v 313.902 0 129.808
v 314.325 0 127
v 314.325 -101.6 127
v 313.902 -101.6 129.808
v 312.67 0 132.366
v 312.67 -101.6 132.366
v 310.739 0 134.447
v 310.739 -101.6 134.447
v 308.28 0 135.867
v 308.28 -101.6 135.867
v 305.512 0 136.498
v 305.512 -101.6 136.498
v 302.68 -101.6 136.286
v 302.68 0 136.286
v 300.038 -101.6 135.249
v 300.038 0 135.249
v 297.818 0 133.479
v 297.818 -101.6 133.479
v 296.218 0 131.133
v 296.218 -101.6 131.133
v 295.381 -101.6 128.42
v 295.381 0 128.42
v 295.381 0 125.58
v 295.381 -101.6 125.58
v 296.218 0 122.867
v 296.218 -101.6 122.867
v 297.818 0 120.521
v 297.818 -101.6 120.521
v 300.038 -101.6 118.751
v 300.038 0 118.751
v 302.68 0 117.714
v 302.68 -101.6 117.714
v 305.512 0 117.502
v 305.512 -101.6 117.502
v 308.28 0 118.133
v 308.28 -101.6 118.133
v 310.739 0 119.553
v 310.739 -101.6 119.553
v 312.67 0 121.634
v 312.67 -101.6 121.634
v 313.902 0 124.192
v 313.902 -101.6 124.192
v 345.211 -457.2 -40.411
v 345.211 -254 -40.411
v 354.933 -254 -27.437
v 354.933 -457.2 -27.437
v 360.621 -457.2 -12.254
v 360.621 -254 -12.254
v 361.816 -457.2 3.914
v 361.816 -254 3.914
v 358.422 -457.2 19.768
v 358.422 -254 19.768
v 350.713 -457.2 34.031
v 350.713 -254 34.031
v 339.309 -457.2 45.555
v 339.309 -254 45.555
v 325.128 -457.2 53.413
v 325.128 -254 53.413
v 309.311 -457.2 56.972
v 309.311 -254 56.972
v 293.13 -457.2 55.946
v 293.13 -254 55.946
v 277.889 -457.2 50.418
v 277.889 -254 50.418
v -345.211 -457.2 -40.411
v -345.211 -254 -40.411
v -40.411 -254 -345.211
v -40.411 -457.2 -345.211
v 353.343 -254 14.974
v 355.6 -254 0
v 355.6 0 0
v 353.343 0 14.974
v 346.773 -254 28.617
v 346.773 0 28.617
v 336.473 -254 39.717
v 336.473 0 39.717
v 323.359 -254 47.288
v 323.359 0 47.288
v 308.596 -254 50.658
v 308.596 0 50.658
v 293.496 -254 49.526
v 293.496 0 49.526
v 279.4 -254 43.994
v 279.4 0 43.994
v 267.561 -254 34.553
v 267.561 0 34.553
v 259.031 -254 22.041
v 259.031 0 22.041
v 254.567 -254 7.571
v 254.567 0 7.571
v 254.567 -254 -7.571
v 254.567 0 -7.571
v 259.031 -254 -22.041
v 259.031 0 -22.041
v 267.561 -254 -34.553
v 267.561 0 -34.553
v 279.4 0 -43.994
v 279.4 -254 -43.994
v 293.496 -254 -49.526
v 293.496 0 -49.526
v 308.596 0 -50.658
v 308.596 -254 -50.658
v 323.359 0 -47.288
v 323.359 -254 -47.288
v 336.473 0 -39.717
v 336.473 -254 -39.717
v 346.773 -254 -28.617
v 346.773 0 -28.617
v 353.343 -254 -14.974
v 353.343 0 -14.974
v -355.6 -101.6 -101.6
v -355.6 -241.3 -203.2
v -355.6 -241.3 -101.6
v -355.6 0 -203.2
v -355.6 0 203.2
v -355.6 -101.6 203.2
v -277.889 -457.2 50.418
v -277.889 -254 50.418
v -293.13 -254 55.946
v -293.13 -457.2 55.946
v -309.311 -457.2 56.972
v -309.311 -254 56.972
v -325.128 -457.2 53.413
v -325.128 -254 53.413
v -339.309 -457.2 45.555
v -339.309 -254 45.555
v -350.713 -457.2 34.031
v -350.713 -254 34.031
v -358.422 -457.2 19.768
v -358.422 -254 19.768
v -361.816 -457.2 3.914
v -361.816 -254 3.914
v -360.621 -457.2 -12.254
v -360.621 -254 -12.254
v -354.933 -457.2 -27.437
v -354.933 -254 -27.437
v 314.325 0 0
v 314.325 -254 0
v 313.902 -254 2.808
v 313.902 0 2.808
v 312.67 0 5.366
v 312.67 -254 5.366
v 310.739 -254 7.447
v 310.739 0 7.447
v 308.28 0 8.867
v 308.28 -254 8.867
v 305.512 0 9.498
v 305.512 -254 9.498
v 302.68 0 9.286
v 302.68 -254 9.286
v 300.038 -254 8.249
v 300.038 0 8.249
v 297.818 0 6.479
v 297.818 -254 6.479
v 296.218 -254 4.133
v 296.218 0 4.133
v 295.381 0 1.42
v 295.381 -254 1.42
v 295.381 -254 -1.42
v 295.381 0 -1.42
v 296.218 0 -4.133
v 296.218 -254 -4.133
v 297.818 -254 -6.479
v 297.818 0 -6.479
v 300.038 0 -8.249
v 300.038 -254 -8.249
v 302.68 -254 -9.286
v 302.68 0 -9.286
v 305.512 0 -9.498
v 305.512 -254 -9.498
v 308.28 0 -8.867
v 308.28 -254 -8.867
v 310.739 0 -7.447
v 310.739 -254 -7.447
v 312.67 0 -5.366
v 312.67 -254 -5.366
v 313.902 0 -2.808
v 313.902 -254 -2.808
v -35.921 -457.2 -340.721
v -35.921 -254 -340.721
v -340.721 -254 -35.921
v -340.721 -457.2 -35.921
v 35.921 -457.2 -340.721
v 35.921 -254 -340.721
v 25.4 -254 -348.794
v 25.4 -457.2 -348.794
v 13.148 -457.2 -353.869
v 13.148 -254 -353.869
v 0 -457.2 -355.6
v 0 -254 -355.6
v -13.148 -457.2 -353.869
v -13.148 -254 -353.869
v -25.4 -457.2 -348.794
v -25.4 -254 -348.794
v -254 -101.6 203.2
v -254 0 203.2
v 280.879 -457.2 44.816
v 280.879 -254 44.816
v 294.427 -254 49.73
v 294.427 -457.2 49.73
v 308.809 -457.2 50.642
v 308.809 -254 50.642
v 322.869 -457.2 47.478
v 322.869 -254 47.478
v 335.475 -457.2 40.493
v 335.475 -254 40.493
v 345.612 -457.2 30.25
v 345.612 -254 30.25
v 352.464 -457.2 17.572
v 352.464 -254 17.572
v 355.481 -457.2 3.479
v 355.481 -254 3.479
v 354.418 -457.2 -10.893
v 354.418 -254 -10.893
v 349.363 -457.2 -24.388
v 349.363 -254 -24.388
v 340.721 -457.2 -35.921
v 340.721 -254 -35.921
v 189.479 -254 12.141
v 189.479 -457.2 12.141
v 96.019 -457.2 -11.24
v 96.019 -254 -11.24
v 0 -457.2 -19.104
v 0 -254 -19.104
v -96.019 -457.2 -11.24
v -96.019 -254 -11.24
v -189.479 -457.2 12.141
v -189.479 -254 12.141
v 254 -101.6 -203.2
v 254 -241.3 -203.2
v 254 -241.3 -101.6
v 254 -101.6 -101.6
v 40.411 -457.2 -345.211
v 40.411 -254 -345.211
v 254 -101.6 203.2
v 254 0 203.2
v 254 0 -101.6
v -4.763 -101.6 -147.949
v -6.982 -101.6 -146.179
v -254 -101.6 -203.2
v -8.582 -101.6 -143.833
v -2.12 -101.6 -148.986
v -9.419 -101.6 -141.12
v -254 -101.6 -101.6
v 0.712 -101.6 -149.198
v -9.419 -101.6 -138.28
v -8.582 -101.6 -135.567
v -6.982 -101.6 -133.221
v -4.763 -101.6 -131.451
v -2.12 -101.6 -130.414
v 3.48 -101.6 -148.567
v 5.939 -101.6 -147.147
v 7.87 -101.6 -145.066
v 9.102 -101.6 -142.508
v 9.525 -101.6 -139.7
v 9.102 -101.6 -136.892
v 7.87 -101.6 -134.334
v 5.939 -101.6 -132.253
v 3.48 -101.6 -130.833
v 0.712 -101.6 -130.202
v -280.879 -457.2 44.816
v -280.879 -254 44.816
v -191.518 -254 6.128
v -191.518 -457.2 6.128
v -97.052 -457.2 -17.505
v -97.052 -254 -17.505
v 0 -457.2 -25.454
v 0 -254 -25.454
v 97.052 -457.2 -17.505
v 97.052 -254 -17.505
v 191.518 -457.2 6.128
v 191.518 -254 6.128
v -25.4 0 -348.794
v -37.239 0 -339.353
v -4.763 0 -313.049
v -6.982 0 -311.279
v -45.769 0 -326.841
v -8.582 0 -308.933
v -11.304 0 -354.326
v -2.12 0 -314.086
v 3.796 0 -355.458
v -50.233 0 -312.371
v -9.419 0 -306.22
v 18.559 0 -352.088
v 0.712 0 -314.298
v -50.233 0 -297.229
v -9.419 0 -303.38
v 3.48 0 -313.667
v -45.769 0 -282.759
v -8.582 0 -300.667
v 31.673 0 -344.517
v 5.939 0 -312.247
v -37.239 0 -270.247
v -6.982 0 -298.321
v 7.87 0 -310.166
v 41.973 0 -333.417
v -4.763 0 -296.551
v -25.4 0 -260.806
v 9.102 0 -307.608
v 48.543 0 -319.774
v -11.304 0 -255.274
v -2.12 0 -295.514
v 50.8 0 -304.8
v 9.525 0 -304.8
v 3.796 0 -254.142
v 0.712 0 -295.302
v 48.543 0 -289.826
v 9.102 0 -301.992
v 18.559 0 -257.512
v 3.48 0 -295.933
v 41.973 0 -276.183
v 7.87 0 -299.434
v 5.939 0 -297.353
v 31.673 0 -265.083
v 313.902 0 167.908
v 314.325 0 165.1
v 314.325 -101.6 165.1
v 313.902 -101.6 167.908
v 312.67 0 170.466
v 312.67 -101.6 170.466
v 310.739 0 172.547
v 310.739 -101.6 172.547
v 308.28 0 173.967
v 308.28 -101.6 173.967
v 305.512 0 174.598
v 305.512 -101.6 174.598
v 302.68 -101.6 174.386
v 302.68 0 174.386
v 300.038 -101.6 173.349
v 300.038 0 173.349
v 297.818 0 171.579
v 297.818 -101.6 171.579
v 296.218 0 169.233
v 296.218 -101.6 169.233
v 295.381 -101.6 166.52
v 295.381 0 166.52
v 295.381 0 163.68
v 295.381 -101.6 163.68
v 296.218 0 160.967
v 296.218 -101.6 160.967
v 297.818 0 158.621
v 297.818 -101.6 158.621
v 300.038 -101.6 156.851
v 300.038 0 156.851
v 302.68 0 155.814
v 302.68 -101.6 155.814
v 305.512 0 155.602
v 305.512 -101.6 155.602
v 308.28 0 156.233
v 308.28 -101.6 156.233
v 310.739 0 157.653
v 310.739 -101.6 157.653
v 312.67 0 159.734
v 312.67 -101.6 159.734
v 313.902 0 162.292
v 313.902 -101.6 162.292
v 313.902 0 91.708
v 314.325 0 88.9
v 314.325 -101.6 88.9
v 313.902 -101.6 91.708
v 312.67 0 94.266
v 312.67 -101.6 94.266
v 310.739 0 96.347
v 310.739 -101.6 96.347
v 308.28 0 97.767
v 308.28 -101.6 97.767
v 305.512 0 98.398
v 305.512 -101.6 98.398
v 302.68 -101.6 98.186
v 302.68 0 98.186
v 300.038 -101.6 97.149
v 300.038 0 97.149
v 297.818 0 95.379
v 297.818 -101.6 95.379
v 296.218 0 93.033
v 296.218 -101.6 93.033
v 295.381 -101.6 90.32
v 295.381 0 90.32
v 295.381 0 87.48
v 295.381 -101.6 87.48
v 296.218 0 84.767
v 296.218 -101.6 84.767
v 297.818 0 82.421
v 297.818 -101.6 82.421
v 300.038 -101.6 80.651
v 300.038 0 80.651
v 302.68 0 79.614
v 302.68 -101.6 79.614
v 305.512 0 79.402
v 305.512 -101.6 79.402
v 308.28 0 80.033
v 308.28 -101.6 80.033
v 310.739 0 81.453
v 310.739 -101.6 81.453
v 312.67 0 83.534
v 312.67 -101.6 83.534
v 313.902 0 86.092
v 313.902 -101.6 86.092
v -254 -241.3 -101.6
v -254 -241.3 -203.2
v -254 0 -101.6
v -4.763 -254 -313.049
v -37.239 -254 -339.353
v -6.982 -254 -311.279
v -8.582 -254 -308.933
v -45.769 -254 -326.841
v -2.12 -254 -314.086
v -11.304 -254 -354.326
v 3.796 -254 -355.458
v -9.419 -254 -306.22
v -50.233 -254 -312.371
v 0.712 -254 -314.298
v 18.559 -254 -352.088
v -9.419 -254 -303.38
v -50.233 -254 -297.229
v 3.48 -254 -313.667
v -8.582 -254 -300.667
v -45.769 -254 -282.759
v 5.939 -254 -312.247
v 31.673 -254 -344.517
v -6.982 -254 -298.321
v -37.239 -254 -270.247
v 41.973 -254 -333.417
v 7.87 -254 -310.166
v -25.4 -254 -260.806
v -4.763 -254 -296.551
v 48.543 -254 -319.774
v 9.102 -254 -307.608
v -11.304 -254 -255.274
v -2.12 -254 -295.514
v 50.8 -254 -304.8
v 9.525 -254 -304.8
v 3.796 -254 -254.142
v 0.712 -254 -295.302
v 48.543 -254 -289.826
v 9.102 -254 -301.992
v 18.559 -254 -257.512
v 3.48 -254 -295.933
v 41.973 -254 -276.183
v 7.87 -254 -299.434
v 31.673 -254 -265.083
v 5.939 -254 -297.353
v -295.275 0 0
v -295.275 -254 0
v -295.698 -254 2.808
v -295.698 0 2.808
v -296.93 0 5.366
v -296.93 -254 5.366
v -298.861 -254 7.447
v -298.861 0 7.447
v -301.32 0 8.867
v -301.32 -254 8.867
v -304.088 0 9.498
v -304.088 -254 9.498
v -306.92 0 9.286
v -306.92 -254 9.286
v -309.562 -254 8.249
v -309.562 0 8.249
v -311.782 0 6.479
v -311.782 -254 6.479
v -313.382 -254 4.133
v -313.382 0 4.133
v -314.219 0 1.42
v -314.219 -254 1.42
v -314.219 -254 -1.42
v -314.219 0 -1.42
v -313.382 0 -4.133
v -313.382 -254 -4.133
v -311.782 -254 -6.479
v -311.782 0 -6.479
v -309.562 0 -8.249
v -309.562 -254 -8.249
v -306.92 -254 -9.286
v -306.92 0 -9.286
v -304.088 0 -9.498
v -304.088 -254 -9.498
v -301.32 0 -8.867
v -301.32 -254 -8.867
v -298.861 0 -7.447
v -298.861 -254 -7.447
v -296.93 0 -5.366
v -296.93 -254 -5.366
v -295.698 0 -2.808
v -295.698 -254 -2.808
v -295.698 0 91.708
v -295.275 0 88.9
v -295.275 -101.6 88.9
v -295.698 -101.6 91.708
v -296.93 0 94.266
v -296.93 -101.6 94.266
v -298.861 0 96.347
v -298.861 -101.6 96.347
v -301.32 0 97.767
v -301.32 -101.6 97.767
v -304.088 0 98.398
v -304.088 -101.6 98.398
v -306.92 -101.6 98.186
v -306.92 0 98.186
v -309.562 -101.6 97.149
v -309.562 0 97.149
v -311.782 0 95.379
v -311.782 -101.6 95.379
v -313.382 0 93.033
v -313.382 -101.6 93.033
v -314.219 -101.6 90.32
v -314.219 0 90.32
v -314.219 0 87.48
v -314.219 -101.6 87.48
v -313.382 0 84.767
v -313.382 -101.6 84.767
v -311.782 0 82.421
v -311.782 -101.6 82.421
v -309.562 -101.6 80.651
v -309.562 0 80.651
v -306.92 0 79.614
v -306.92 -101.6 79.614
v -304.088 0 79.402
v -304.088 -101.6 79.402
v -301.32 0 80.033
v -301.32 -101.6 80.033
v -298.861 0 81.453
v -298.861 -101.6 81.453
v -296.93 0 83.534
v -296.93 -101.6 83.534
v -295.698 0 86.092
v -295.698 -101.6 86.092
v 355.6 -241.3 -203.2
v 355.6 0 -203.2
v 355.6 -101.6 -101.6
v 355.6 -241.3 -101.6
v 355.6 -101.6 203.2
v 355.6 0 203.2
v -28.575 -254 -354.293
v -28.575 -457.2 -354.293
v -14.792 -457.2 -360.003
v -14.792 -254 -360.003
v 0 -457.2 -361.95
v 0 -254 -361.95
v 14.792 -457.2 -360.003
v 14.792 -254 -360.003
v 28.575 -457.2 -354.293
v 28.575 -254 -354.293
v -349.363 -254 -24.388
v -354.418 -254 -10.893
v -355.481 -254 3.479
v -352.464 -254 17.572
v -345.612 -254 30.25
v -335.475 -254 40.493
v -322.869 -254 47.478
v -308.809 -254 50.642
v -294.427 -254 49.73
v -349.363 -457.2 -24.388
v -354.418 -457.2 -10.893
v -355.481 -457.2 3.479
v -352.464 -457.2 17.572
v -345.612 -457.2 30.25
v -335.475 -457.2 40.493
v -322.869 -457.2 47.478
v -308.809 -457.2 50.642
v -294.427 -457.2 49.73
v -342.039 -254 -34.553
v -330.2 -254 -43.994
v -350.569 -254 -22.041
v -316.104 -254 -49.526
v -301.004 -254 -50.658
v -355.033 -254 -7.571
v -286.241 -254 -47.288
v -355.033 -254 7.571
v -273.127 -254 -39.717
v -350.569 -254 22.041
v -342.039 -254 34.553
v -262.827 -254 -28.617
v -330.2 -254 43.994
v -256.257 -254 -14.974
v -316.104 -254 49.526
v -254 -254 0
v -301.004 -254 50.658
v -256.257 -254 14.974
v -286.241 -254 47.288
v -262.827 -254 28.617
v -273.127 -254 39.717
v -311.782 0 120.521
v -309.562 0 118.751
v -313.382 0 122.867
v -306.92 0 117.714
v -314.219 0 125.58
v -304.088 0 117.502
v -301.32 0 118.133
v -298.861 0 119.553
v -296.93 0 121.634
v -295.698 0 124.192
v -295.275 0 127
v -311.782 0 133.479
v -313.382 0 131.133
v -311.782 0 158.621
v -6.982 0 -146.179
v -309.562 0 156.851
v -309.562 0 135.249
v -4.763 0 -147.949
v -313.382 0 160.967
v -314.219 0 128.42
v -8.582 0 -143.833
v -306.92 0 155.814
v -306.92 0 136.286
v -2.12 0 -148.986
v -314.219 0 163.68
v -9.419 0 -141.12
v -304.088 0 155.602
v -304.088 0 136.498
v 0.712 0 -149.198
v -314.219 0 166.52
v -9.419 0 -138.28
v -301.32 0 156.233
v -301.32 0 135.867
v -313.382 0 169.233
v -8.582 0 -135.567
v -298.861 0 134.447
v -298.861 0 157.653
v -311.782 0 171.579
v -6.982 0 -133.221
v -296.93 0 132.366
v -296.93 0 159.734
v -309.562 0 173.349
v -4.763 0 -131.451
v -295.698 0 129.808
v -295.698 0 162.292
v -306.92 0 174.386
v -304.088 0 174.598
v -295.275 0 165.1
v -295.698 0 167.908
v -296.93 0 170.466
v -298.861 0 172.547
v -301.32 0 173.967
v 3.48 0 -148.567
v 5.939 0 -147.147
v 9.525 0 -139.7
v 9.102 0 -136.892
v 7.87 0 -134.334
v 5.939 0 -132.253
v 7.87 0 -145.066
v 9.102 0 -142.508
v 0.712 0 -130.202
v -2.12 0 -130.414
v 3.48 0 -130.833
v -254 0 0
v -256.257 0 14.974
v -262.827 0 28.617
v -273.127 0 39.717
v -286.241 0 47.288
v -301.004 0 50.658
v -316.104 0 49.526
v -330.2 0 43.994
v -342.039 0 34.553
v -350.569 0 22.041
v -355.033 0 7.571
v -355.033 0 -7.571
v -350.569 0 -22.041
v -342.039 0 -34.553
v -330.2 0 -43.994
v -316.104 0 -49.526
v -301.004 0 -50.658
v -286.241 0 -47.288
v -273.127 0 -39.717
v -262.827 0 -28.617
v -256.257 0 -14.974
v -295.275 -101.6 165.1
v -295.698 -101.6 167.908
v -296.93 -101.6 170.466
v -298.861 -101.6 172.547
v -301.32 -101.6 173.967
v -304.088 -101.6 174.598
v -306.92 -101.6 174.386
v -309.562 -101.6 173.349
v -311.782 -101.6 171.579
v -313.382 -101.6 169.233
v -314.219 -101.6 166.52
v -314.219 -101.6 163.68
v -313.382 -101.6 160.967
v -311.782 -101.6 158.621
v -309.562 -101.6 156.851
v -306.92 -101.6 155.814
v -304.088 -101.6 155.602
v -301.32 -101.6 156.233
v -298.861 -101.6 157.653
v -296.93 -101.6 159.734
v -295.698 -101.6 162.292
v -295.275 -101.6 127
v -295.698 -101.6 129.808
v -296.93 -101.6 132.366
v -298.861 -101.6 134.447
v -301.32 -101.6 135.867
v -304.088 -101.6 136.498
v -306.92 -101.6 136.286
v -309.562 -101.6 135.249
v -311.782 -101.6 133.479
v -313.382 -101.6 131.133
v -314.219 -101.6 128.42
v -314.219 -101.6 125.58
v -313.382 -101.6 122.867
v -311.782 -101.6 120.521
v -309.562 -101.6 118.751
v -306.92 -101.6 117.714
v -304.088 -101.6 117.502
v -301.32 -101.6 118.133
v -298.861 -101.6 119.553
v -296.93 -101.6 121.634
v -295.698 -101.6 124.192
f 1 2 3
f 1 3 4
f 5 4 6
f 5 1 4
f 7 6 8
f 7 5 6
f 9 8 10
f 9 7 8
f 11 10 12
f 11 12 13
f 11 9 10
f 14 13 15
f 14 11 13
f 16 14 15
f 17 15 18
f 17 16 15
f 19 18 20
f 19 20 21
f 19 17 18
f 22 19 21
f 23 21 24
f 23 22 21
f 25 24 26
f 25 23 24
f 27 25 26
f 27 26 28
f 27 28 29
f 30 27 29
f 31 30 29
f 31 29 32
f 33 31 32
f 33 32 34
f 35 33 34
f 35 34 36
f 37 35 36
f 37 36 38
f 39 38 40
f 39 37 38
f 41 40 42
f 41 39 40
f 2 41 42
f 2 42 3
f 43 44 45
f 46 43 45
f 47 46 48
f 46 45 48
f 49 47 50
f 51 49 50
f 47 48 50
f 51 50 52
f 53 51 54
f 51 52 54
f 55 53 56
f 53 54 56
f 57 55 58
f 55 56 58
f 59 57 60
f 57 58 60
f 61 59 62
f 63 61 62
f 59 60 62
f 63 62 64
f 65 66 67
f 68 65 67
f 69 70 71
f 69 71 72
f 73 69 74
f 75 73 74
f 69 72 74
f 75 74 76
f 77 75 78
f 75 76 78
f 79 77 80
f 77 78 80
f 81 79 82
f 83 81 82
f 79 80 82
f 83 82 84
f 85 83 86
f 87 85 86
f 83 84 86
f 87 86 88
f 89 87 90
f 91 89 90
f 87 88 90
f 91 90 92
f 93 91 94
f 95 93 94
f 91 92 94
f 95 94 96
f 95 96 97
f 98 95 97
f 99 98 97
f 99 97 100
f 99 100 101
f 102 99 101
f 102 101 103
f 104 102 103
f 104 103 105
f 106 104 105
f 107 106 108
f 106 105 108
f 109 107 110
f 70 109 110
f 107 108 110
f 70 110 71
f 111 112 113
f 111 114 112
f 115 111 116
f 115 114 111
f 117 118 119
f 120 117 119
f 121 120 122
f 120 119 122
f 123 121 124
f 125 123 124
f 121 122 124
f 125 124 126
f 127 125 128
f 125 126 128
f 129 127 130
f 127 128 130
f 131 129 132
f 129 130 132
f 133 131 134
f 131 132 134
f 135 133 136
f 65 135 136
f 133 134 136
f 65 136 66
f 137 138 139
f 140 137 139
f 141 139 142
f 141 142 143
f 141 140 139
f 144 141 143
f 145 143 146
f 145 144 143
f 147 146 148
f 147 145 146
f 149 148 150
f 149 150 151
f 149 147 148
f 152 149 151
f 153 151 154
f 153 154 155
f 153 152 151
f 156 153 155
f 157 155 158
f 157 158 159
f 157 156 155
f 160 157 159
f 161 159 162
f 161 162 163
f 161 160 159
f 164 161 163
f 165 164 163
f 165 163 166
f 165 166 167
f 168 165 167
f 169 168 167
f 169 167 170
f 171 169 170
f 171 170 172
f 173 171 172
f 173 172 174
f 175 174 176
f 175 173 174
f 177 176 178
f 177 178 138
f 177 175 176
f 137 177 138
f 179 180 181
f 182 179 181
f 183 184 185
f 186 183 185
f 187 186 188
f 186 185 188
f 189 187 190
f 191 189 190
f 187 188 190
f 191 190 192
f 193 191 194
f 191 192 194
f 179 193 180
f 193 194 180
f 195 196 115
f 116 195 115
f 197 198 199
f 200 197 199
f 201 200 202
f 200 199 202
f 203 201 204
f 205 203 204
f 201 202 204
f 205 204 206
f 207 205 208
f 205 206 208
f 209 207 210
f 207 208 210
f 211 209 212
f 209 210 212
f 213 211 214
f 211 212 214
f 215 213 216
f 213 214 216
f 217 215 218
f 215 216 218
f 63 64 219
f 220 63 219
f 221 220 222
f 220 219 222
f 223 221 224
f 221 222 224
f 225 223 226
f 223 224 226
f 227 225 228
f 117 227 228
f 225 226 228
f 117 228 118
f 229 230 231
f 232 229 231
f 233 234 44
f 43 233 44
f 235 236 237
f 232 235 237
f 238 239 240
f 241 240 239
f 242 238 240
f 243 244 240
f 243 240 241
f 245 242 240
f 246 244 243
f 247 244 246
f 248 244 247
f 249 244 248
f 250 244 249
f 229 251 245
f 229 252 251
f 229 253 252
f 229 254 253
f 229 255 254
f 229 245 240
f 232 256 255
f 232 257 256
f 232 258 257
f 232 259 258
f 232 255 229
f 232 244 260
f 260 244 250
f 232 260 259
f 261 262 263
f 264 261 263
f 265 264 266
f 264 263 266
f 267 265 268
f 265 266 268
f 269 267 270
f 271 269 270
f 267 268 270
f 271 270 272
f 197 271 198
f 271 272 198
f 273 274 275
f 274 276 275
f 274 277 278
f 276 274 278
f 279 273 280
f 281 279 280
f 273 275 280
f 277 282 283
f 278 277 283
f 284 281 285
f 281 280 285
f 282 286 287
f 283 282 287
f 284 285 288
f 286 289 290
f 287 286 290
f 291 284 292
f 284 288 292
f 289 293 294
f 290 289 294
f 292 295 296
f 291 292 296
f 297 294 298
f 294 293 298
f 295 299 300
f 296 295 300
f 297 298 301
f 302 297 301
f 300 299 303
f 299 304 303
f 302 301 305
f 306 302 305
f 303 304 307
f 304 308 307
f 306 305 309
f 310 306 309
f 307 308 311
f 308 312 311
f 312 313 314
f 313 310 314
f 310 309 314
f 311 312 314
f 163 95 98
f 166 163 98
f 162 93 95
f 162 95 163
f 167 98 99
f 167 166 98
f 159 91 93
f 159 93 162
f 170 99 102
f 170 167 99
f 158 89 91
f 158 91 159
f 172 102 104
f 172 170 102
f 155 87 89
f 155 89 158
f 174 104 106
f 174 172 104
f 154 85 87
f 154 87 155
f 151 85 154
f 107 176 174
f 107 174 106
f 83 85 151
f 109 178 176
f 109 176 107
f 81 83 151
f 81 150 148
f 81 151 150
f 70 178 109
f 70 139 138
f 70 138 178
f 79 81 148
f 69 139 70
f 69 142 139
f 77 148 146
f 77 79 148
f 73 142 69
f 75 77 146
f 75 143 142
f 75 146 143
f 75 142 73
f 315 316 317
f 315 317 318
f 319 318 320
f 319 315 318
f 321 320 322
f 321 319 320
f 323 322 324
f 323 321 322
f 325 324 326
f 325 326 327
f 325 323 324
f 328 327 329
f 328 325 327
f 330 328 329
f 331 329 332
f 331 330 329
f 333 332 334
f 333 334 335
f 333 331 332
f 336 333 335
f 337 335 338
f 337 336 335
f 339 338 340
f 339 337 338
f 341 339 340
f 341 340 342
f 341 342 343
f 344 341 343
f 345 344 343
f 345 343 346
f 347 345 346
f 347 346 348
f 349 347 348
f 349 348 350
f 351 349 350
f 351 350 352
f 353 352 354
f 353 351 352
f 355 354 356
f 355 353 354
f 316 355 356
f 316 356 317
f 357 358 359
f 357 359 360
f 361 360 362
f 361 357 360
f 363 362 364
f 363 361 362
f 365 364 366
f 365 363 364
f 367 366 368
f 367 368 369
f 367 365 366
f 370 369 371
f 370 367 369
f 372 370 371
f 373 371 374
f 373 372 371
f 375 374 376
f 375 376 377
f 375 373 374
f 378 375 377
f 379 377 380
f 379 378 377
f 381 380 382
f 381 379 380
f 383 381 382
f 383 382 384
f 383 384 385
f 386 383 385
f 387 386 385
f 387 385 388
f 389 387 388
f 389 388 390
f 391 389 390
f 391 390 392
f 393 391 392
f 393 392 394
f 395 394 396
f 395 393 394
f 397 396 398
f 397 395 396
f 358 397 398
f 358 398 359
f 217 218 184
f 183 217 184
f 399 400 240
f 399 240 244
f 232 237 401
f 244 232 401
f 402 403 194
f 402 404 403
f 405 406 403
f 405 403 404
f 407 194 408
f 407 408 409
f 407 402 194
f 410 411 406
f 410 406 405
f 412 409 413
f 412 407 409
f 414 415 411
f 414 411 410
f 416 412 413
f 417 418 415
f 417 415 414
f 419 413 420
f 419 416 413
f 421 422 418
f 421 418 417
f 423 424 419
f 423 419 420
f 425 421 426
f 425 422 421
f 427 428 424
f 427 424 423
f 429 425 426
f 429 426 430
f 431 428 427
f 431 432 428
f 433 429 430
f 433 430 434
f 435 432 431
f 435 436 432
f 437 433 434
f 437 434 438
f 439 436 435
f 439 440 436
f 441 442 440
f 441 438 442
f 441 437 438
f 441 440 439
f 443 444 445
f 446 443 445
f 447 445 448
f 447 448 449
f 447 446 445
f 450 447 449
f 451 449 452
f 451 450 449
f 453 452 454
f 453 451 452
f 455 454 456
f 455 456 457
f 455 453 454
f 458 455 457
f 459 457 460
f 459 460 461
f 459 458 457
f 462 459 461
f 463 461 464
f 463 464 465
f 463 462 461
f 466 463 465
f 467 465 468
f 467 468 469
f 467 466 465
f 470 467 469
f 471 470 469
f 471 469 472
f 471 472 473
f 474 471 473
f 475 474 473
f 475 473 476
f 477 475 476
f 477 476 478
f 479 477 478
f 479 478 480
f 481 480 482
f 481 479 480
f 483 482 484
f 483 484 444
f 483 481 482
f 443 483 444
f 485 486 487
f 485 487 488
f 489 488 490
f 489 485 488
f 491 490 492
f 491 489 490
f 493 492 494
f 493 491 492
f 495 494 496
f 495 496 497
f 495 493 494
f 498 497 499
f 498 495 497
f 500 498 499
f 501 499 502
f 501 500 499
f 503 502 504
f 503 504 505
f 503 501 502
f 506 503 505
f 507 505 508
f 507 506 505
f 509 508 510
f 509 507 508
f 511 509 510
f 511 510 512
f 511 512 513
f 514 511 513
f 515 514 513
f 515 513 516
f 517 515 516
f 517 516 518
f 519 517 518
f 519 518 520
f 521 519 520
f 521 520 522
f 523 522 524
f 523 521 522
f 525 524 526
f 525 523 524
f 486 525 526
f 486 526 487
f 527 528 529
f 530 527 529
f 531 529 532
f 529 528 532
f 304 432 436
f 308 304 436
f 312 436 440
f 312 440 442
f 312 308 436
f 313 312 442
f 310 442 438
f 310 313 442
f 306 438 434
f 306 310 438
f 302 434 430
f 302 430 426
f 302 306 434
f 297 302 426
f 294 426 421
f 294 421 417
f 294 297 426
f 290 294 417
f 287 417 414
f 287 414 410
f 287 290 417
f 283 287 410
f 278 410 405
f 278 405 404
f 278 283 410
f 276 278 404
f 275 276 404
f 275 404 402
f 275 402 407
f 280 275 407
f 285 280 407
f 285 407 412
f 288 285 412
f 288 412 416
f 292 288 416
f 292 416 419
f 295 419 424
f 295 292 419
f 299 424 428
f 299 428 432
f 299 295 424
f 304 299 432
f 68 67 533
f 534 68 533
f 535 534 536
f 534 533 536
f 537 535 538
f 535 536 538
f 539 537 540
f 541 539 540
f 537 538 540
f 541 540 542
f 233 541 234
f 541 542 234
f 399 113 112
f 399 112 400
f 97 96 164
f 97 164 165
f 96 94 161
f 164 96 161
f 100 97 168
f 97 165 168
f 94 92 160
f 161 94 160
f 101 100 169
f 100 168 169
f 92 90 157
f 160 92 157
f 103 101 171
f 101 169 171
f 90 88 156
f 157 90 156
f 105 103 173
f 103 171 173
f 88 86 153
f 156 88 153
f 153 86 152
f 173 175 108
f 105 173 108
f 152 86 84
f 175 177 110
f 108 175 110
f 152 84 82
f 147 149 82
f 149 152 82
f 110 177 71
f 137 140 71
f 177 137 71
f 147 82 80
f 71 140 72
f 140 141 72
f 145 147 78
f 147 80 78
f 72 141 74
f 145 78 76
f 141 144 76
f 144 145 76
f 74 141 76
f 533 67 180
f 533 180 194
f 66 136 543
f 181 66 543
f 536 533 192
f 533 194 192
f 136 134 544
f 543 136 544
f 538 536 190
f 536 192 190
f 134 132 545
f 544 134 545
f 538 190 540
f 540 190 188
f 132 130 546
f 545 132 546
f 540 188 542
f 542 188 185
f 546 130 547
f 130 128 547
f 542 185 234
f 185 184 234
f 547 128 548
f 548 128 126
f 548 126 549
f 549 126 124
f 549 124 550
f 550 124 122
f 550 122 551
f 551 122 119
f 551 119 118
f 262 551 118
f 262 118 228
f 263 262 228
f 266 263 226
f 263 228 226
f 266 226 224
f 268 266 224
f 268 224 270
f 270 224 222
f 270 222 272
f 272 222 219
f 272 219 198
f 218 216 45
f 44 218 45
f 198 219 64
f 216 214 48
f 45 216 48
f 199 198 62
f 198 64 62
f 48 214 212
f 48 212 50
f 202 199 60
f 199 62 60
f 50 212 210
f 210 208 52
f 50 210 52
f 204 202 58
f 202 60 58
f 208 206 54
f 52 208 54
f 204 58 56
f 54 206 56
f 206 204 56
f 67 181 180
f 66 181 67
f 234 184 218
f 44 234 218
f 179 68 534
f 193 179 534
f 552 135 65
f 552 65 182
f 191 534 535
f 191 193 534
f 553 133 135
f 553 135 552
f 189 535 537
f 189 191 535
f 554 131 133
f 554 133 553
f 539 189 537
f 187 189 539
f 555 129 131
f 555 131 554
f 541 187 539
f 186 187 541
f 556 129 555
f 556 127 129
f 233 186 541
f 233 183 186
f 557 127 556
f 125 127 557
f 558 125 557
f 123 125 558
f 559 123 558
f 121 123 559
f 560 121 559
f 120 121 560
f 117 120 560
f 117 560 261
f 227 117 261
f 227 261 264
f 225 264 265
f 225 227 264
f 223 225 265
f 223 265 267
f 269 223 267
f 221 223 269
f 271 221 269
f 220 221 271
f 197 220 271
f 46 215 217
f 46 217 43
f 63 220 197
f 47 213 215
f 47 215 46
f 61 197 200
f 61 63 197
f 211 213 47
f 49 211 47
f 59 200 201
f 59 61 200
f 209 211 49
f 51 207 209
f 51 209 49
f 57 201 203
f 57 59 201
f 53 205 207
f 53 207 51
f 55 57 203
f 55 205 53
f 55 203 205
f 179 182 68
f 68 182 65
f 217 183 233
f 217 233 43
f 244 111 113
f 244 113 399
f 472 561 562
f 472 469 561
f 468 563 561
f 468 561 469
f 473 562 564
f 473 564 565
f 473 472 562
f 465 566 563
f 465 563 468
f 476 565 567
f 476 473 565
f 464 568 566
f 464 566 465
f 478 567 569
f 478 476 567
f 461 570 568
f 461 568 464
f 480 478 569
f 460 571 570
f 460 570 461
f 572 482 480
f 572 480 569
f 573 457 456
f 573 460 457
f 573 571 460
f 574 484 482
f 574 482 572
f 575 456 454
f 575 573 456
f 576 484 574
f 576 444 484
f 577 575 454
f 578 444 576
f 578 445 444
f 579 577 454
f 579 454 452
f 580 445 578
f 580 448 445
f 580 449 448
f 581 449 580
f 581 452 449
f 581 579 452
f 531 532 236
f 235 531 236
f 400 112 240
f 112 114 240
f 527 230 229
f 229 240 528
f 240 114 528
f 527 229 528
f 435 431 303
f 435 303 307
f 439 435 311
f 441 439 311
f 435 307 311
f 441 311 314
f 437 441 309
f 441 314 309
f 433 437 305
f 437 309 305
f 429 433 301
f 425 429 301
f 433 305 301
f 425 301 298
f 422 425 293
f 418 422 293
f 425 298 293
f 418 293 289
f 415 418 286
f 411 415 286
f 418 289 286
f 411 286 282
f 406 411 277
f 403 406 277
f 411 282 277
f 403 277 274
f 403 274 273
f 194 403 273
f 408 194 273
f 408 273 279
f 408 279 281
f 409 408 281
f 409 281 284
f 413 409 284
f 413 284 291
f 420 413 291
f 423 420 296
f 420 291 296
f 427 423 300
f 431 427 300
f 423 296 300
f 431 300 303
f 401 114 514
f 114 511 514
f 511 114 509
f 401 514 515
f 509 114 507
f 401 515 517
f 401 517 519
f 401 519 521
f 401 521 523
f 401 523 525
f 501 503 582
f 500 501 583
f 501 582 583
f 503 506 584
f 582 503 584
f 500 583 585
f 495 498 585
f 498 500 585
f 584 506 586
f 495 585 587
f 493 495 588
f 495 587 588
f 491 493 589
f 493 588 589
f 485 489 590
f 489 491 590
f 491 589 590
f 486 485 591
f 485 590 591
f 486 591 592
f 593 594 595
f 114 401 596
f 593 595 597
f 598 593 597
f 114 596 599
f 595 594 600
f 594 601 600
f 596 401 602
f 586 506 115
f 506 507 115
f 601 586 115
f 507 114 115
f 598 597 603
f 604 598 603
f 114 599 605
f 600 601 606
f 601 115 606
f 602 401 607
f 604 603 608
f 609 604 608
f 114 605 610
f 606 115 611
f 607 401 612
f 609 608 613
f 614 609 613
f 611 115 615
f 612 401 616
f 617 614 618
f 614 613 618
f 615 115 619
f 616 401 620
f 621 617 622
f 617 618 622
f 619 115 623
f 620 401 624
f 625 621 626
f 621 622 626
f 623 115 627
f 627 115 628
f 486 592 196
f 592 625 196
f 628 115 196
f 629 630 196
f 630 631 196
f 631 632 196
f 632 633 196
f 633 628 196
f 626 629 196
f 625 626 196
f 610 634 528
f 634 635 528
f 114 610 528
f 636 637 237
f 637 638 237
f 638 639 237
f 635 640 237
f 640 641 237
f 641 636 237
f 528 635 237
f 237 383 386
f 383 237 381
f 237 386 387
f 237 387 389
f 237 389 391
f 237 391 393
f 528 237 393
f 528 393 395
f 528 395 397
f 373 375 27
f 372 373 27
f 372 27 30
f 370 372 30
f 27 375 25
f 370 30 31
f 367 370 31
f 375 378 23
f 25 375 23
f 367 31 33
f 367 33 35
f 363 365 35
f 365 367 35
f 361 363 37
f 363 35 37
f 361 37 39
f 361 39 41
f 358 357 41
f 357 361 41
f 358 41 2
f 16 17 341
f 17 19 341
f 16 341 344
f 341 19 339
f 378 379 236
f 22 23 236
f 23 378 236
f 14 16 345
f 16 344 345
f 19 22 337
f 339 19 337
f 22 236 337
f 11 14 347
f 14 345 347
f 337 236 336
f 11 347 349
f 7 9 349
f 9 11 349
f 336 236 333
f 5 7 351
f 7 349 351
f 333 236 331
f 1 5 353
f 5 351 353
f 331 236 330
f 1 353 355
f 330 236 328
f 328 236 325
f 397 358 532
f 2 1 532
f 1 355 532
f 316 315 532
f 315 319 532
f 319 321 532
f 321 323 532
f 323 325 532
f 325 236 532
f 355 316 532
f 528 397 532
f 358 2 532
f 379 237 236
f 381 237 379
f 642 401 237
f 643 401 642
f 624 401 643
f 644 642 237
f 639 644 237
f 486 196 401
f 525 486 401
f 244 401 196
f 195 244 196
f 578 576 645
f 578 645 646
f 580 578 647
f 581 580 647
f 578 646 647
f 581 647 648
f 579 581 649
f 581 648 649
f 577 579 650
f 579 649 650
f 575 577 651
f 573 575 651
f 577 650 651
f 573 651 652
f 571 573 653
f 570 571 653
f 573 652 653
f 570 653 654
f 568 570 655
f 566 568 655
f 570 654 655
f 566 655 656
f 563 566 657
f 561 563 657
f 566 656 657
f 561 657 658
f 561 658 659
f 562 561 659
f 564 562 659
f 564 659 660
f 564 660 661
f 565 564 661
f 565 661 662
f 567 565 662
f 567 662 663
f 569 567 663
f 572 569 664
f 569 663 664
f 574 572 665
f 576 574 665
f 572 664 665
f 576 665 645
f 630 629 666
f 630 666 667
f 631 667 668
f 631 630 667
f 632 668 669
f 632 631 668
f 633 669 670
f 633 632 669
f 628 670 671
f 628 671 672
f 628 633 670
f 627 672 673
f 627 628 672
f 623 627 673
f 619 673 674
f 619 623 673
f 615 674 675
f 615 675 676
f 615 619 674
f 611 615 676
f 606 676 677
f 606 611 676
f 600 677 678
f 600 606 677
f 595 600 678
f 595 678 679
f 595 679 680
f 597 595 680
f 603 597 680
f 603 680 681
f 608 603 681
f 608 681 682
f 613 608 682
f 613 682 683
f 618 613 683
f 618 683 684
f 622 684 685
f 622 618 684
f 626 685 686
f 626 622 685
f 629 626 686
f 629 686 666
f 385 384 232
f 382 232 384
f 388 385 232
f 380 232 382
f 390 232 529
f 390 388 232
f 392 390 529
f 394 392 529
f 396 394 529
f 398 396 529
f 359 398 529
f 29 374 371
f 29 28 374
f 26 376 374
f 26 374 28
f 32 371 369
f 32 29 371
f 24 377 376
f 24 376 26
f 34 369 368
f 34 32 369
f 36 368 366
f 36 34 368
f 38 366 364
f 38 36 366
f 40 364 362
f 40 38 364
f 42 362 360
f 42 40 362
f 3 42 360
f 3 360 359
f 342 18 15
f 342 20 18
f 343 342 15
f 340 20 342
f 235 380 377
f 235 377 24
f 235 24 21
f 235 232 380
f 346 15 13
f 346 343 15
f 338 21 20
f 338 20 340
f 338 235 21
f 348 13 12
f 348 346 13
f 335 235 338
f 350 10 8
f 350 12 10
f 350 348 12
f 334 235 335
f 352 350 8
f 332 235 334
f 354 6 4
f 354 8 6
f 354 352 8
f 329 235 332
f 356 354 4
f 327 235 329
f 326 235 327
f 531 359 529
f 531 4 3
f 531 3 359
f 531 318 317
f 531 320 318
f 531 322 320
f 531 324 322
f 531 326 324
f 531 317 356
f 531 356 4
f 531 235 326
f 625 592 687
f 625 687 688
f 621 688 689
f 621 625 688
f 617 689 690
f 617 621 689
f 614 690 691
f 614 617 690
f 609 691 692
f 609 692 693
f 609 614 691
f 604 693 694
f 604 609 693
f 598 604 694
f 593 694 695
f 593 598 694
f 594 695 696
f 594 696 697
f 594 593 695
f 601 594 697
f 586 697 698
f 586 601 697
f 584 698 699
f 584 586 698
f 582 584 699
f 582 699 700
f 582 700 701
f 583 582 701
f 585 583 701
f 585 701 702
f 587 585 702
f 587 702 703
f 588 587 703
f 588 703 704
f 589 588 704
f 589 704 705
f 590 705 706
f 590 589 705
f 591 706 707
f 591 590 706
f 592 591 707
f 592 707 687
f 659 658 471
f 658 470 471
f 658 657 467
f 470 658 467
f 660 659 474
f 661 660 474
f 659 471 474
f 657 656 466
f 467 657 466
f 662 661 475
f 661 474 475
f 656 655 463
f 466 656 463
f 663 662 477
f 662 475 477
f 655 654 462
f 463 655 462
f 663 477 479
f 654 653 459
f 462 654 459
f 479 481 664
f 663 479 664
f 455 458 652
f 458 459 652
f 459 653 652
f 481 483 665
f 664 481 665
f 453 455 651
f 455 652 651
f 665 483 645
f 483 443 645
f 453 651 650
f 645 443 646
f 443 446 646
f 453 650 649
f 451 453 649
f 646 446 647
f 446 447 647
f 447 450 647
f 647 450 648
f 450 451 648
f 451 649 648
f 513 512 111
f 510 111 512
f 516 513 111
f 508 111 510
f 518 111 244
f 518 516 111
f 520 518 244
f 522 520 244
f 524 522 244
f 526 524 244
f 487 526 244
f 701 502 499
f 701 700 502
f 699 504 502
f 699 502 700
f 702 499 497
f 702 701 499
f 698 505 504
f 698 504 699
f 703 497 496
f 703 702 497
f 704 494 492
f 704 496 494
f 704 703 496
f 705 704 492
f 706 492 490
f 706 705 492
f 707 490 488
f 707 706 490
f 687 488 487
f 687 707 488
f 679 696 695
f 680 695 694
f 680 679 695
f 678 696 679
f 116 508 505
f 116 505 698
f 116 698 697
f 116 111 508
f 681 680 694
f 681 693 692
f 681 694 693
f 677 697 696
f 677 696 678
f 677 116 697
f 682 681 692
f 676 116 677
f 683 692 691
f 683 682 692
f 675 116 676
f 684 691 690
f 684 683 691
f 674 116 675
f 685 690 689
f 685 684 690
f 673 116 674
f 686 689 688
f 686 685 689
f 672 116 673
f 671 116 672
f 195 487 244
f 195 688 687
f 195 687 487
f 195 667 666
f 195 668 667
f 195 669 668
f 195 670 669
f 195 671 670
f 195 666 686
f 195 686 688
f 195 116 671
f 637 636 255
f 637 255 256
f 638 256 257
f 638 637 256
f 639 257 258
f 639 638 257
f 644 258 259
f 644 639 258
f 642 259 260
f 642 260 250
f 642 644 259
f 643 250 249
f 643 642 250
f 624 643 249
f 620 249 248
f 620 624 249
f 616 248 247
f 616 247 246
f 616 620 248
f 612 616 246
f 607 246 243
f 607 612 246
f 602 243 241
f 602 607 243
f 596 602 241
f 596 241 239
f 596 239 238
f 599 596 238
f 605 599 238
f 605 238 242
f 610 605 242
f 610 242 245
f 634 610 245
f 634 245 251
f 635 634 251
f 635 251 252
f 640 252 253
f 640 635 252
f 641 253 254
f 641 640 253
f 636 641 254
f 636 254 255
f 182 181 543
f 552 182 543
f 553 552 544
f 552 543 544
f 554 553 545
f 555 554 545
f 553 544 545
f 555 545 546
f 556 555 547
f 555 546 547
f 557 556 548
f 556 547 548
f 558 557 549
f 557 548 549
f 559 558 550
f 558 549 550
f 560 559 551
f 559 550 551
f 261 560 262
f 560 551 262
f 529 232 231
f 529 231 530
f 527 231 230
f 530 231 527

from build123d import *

# Parameters (mm, degrees)
F0_R     = 50.8
F0_R_2   = 9.525
F1_DEPTH = 254
F2_R     = 9.525
F3_DEPTH = 101.6
F5_DEPTH = 203.2
F6_W     = 101.6
F6_H     = 101.6
F7_DEPTH = 139.7


# Not quite as in the source:
# - a feature names something its author has since deleted; it is built from what else it names


with BuildPart() as f1:
    # F0 (on Front) → F1 (new body)
    with BuildSketch(Plane.XZ):
        with Locations((-304.8, 0)):
            Circle(F0_R)
        with Locations((-304.8, 0)):
            Circle(F0_R_2, mode=Mode.SUBTRACT)
    extrude(amount=F1_DEPTH)


with BuildPart() as f1b:
    # F0 (on Front) → F1, piece 2 (new body)
    with BuildSketch(Plane.XZ):
        with Locations((304.8, 0)):
            Circle(F0_R)
        with Locations((304.8, 0)):
            Circle(F0_R_2, mode=Mode.SUBTRACT)
    extrude(amount=F1_DEPTH)


with BuildPart() as f1c:
    # F0 (on Front) → F1, piece 3 (new body)
    with BuildSketch(Plane.XZ):
        with Locations((0, -304.8)):
            Circle(F0_R)
        with Locations((0, -304.8)):
            Circle(F0_R_2, mode=Mode.SUBTRACT)
    extrude(amount=F1_DEPTH)


with BuildPart() as f3:
    # F2 (on Front) → F3 (new body)
    with BuildSketch(Plane.XZ):
        Polygon((-254, 203.2), (-287.8666666667, 203.2), (-321.7333333333, 203.2), (-355.6, 203.2), (-355.6, -203.2), (355.6, -203.2), (355.6, 203.2), (254, 203.2), (254, -101.6), (-254, -101.6), align=None)
        with Locations((0, -139.7)):
            Circle(F2_R, mode=Mode.SUBTRACT)
        with Locations((-304.8, 88.9)):
            Circle(F2_R, mode=Mode.SUBTRACT)
        with Locations((-304.8, 127)):
            Circle(F2_R, mode=Mode.SUBTRACT)
        with Locations((-304.8, 165.1)):
            Circle(F2_R, mode=Mode.SUBTRACT)
        with Locations((304.8, 88.9)):
            Circle(F2_R, mode=Mode.SUBTRACT)
        with Locations((304.8, 127)):
            Circle(F2_R, mode=Mode.SUBTRACT)
        with Locations((304.8, 165.1)):
            Circle(F2_R, mode=Mode.SUBTRACT)
    extrude(amount=F3_DEPTH)

    # F6 (on face) → F7 (join)
    with BuildSketch(Plane.XZ.offset(101.6)):
        with Locations((-304.8, -152.4)):
            Rectangle(F6_W, F6_H)
        with Locations((304.8, -152.4)):
            Rectangle(F6_W, F6_H)
    extrude(amount=F7_DEPTH)


with BuildPart() as f5:
    # F4 (on face) → F5 (new body)
    with BuildSketch(Plane.XZ.offset(254)):
        with BuildLine():
            ThreePointArc((277.8891748053, 50.4175563404), (0, -19.1036567568), (-277.8891748053, 50.4175563404))
            ThreePointArc((-277.8891748053, 50.4175563404), (-350.7132693138, 34.030783137), (-345.2111525448, -40.4111525448))
            Line((-345.2111525448, -40.4111525448), (-40.4111525448, -345.2111525448))
            ThreePointArc((-40.4111525448, -345.2111525448), (0, -361.95), (40.4111525448, -345.2111525448))
            Line((40.4111525448, -345.2111525448), (345.2111525448, -40.4111525448))
            ThreePointArc((345.2111525448, -40.4111525448), (350.7132693138, 34.030783137), (277.8891748053, 50.4175563404))
        make_face()
        with BuildLine():
            ThreePointArc((-340.7210244843, -35.9210244843), (-345.6117949456, 30.2495850107), (-280.8792664936, 44.8156056359))
            ThreePointArc((-280.8792664936, 44.8156056359), (0, -25.4536567568), (280.8792664936, 44.8156056359))
            ThreePointArc((280.8792664936, 44.8156056359), (345.6117949456, 30.2495850107), (340.7210244843, -35.9210244843))
            Line((340.7210244843, -35.9210244843), (35.9210244843, -340.7210244843))
            ThreePointArc((35.9210244843, -340.7210244843), (0, -355.6), (-35.9210244843, -340.7210244843))
            Line((-35.9210244843, -340.7210244843), (-340.7210244843, -35.9210244843))
        make_face(mode=Mode.SUBTRACT)
    extrude(amount=F5_DEPTH)


solid = Compound([f1.part, f1b.part, f1c.part, f3.part, f5.part])
